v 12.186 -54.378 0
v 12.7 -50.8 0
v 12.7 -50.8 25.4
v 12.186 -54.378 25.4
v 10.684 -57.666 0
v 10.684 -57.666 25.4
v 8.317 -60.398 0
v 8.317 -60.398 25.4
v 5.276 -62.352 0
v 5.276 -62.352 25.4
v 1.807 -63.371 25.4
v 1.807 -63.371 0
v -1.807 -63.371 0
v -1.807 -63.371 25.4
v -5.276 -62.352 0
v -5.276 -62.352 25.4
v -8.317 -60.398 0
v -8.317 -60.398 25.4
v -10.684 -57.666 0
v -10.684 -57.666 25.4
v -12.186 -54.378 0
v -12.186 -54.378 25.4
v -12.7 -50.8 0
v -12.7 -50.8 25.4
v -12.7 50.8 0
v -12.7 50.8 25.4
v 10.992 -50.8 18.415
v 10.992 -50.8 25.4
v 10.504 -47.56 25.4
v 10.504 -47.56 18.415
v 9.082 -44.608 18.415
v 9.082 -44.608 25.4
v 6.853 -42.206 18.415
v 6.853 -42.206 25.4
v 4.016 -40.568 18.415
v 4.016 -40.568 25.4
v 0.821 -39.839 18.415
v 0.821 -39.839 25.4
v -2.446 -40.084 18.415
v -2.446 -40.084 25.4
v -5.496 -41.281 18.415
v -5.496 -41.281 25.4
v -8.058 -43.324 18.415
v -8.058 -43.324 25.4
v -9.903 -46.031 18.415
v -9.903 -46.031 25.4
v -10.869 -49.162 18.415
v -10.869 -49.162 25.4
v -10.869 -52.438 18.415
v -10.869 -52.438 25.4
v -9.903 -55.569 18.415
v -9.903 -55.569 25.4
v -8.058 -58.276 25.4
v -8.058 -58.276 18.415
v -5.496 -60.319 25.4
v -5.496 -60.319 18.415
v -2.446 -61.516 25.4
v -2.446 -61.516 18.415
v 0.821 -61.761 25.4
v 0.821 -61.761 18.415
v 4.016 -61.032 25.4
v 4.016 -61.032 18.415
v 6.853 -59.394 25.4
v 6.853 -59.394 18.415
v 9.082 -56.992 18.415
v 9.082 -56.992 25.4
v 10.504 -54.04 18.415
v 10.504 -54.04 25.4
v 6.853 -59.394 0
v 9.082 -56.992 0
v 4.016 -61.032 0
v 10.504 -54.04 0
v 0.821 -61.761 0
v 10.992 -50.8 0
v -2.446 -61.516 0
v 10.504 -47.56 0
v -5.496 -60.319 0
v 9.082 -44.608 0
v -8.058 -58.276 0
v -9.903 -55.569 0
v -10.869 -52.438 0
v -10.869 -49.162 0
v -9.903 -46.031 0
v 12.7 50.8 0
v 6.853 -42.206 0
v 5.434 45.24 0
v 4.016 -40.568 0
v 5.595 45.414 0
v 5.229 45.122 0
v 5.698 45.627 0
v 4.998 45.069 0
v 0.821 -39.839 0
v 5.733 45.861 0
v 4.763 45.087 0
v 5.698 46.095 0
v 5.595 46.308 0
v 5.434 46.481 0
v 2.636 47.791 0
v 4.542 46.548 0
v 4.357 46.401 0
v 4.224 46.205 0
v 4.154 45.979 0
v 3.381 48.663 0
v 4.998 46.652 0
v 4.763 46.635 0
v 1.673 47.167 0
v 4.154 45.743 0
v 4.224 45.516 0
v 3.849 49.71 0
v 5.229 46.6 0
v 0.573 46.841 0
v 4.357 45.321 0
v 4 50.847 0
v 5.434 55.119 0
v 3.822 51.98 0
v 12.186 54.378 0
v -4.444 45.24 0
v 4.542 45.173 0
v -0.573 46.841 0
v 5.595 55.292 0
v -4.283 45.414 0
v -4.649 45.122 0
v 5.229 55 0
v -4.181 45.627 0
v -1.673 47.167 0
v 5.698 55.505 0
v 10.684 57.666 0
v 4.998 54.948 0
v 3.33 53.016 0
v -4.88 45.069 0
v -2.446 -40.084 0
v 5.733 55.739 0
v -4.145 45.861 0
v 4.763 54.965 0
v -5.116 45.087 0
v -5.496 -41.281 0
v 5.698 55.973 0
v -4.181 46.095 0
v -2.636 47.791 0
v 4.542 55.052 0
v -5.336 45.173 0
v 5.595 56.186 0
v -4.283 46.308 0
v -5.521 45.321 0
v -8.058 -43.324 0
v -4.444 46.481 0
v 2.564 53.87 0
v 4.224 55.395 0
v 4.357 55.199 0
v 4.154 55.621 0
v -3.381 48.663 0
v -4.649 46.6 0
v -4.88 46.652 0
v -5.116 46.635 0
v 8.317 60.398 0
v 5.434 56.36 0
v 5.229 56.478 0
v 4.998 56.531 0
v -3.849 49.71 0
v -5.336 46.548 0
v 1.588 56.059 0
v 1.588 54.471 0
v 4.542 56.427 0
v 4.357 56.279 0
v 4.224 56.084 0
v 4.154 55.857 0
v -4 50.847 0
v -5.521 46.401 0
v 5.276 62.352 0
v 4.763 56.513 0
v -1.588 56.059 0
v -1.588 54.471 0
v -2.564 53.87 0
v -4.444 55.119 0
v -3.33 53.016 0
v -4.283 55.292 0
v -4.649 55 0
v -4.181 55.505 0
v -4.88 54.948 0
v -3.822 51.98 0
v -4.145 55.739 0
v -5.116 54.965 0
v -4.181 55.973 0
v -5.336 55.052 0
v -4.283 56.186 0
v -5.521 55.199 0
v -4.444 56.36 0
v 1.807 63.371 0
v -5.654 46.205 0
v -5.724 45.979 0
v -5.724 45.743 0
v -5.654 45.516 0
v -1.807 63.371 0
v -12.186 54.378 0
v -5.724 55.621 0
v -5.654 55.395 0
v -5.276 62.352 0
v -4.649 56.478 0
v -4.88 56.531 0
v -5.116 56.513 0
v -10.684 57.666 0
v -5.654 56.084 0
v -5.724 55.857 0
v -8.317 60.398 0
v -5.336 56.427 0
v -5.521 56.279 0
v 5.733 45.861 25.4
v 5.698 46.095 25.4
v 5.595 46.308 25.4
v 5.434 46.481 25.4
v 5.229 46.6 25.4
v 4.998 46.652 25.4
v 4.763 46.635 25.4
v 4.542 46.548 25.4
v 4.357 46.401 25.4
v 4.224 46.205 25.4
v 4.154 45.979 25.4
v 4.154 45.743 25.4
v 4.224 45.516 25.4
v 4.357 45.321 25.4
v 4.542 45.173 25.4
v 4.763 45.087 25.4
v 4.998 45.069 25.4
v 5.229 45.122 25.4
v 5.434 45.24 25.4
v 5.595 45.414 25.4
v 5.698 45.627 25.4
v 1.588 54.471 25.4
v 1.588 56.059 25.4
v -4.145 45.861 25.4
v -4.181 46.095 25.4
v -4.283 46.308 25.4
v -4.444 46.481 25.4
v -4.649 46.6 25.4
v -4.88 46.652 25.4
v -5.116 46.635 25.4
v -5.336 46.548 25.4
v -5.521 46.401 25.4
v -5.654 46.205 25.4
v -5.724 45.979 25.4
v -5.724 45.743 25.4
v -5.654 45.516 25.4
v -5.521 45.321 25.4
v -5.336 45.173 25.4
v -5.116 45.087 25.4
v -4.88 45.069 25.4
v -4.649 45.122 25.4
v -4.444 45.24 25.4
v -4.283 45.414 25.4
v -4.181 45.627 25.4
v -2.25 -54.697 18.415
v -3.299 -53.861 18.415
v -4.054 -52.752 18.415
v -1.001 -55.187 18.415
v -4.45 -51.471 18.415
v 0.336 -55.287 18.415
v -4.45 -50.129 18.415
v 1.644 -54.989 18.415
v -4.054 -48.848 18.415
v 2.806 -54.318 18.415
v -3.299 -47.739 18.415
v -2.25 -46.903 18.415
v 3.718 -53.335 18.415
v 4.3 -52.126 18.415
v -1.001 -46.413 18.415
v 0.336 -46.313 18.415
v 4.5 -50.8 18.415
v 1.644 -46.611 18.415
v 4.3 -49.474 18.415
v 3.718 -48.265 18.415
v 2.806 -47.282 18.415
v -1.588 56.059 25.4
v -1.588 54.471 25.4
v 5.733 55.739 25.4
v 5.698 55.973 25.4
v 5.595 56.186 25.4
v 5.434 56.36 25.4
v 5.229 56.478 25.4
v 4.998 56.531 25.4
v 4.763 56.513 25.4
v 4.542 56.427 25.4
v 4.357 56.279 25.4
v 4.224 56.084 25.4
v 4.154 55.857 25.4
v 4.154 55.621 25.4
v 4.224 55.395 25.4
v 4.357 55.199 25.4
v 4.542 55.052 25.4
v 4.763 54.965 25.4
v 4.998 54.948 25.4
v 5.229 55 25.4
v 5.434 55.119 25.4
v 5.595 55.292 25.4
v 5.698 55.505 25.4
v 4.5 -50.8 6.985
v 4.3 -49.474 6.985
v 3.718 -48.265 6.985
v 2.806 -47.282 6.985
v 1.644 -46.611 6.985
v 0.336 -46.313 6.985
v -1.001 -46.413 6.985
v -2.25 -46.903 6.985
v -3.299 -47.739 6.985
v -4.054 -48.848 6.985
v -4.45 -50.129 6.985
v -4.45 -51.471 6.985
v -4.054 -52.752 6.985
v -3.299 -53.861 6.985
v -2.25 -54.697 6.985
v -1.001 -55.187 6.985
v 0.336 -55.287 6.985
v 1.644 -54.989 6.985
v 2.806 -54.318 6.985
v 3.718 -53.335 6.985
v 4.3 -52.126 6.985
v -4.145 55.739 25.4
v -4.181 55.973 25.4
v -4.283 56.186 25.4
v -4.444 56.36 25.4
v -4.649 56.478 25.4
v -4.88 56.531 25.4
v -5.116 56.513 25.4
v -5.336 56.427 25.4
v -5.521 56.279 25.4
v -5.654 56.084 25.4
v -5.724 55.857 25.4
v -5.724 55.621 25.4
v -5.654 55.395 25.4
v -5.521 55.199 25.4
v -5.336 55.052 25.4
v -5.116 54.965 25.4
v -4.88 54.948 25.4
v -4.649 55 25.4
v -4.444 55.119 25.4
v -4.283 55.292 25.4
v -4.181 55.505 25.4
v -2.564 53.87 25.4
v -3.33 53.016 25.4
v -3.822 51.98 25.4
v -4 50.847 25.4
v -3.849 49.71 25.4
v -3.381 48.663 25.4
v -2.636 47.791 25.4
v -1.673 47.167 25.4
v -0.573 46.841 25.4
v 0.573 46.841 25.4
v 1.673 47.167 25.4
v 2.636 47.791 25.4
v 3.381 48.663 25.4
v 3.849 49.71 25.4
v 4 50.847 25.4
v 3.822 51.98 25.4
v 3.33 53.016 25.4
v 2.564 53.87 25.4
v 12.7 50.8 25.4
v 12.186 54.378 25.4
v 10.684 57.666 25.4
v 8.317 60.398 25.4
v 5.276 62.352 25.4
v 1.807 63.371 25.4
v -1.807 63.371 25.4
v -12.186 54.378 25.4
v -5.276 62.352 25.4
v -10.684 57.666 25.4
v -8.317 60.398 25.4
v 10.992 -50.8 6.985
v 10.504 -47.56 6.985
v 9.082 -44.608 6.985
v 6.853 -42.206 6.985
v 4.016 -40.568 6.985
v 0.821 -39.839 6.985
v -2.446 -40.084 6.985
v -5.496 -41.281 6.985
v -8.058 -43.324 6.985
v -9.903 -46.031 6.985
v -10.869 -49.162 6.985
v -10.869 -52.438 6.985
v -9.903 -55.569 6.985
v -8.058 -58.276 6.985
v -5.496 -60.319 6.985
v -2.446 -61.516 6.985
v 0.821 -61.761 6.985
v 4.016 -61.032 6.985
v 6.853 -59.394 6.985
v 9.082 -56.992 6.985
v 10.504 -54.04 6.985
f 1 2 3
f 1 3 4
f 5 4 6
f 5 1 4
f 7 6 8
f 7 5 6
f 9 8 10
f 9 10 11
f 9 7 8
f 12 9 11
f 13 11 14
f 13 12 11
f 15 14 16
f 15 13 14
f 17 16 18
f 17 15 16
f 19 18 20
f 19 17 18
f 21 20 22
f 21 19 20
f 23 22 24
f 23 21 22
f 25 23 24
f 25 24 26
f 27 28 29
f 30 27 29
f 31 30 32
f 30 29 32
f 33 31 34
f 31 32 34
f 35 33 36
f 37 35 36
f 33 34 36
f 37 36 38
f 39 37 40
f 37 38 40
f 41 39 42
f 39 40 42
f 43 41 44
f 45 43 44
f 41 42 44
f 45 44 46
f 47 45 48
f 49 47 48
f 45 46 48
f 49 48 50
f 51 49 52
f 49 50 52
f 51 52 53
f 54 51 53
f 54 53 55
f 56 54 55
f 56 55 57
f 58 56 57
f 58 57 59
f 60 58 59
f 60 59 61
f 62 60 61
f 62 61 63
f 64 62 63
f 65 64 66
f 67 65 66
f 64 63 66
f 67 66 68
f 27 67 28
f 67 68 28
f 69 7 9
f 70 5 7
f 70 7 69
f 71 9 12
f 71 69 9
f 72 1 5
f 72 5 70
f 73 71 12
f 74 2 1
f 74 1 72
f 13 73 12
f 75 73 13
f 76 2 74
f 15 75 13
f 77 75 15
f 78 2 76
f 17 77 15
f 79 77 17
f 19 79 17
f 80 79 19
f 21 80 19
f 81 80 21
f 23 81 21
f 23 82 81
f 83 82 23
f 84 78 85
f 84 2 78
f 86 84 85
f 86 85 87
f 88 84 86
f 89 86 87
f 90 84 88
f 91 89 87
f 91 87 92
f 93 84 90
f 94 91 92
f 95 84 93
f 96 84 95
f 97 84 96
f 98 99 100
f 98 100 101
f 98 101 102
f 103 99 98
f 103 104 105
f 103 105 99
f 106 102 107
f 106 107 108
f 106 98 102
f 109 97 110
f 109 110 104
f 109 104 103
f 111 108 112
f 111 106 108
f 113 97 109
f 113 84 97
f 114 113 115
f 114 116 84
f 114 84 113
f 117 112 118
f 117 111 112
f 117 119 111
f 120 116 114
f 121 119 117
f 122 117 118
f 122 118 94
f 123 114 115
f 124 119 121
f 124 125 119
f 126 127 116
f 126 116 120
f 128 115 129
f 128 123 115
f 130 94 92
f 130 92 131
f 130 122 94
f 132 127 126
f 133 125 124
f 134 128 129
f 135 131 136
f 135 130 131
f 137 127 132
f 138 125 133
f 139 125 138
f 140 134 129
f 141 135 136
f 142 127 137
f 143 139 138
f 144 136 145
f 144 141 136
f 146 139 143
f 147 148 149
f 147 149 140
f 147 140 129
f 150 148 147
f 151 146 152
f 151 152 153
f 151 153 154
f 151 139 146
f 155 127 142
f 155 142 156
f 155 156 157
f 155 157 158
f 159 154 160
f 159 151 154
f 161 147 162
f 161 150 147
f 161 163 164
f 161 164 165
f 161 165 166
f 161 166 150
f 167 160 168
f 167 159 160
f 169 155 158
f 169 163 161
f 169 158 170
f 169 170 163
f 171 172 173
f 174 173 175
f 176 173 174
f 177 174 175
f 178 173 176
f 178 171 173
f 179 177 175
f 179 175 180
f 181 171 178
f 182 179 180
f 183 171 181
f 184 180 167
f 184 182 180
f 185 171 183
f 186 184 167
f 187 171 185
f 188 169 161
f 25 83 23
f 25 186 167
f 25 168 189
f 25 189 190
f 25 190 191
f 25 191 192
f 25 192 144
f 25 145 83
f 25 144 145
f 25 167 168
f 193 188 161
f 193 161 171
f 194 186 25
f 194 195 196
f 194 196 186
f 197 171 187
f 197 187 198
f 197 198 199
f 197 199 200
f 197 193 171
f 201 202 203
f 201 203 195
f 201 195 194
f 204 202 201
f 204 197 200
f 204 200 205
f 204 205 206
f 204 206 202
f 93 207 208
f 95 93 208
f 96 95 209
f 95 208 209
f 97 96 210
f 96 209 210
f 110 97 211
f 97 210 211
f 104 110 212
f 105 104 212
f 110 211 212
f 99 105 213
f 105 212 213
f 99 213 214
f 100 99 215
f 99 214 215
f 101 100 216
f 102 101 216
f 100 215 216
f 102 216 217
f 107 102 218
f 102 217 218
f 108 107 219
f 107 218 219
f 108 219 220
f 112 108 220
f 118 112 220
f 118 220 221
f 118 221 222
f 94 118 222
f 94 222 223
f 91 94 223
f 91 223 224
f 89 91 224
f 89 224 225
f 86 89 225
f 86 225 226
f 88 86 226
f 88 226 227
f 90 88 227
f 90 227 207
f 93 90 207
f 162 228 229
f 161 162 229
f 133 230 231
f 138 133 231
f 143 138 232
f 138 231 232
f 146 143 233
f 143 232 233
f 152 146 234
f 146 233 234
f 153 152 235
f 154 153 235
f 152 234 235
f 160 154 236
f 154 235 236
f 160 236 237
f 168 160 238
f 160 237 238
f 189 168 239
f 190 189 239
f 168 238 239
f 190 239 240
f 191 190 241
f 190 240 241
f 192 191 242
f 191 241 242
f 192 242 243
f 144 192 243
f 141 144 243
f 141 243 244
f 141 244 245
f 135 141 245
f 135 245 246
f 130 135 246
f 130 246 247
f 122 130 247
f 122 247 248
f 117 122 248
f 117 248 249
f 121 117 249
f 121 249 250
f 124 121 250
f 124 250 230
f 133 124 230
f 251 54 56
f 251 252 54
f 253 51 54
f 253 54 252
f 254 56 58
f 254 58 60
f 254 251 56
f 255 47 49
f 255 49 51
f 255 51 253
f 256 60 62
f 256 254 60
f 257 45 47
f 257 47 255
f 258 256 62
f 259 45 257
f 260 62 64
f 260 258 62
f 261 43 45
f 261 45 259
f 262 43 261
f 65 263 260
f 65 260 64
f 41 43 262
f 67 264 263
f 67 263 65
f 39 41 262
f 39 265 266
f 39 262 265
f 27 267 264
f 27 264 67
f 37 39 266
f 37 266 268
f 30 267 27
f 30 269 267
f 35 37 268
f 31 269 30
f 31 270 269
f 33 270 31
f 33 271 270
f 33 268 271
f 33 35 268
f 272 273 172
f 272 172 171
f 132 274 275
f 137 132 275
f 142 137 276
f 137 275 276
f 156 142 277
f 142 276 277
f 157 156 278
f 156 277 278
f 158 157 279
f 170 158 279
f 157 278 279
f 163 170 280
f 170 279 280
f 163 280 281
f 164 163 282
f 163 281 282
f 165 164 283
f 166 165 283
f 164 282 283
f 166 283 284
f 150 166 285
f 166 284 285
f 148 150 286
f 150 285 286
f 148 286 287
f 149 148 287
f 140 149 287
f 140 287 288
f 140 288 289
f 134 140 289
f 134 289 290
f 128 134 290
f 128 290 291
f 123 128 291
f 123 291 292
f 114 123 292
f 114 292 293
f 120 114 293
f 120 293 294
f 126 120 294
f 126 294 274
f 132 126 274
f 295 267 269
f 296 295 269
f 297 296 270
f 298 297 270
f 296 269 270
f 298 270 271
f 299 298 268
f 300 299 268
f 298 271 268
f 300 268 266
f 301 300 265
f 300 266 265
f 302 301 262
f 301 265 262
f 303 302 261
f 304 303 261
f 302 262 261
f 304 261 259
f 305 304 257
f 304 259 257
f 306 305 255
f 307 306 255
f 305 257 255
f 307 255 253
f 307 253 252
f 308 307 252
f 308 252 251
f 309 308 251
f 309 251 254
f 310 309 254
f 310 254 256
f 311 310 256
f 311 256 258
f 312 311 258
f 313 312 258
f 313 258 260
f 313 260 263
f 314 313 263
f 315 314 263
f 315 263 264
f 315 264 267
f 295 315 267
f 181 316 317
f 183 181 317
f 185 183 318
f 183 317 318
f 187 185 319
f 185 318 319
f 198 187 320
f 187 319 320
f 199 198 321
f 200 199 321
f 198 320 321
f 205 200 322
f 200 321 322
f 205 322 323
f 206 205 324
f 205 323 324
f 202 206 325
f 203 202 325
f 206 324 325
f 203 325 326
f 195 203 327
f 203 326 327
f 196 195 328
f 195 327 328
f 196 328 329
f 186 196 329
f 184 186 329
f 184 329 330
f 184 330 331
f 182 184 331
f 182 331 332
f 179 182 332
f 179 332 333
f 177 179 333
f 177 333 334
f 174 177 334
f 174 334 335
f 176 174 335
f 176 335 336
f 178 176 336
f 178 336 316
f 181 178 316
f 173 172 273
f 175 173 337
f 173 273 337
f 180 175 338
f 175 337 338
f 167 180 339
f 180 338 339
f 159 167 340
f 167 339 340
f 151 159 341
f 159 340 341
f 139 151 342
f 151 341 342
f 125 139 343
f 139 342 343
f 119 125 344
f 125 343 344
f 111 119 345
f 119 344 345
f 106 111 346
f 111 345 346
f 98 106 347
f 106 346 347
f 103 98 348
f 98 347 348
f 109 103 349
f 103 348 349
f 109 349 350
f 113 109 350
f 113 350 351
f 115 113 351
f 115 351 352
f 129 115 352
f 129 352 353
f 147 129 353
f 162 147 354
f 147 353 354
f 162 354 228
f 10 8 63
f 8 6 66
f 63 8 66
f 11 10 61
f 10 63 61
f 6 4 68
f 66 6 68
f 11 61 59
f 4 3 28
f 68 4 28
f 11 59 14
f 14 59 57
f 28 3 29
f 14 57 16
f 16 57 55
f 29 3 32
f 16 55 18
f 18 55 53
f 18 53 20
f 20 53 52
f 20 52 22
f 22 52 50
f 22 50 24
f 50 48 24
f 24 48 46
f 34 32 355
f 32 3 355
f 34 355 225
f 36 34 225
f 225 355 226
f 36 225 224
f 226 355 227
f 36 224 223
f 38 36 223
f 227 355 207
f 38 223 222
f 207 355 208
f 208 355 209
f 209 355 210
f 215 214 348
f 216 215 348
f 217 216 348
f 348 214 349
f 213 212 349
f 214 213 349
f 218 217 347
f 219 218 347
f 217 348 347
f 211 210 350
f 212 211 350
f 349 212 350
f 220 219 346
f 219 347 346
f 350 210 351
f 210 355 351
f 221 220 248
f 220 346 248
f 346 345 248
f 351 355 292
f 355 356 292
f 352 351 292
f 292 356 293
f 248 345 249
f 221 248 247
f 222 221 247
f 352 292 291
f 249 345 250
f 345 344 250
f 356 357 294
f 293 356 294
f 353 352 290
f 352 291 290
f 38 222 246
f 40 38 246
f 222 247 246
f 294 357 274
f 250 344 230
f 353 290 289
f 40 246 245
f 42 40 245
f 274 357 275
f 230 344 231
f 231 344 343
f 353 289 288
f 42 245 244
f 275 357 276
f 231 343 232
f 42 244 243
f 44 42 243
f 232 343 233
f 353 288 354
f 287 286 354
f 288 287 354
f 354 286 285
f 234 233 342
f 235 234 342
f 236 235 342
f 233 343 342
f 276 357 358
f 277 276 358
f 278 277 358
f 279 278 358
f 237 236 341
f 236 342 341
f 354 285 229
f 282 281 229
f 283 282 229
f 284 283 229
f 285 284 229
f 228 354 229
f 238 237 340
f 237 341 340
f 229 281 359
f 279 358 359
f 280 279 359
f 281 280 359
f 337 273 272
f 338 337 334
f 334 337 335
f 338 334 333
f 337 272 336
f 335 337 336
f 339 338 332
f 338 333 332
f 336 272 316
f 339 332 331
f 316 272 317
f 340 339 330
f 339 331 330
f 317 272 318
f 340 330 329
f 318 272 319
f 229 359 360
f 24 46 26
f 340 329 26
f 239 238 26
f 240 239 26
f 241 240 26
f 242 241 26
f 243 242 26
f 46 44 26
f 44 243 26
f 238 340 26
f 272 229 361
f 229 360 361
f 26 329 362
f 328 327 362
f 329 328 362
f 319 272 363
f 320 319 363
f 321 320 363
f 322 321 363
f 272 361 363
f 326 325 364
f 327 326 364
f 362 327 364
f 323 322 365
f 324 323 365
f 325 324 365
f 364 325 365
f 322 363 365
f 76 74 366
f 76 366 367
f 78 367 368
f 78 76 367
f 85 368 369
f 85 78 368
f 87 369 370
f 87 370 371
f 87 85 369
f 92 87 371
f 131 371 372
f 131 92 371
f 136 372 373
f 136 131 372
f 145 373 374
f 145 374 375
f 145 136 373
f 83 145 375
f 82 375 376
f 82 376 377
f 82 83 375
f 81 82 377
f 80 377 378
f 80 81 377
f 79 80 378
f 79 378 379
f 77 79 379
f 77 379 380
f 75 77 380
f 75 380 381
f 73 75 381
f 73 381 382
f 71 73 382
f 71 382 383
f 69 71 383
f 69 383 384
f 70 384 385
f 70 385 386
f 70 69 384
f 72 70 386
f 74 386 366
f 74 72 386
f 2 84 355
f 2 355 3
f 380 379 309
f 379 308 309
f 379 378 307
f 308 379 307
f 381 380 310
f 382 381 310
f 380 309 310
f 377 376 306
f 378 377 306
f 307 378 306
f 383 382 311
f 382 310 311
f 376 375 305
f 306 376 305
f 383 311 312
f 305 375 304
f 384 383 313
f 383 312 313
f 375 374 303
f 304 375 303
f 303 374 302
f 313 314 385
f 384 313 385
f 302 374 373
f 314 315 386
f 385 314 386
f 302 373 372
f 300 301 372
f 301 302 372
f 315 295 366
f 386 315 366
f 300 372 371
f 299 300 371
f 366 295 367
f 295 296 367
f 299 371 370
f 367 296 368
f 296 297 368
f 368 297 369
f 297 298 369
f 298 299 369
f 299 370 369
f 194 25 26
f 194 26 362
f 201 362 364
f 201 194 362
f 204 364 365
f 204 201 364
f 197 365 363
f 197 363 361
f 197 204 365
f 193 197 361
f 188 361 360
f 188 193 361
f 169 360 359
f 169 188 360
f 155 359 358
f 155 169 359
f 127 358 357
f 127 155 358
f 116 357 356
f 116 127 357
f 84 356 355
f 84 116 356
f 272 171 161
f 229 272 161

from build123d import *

# Parameters (mm, degrees)
BOSS_EXTRUDE1_DEPTH = 25.4
CUT_EXTRUDE1_REACH  = 27.4
SKETCH2_R           = 4
SKETCH2_R_2         = 0.79375
SKETCH3_W           = 3.175
SKETCH3_H           = 1.5875
CUT_EXTRUDE2_DEPTH  = 26.4
SKETCH4_R           = 10.99185
CUT_EXTRUDE3_DEPTH  = 6.985
SKETCH5_R           = 4.5
CUT_EXTRUDE4_DEPTH  = 19.415


with BuildPart() as part:
    # Sketch1 → Boss-Extrude1 (new body)
    with BuildSketch(Plane.XY):
        with BuildLine():
            Line((12.7, 50.8), (12.7, -50.8))
            ThreePointArc((12.7, -50.8), (0, -63.5), (-12.7, -50.8))
            Line((-12.7, -50.8), (-12.7, 50.8))
            ThreePointArc((-12.7, 50.8), (0, 63.5), (12.7, 50.8))
        make_face()
    extrude(amount=BOSS_EXTRUDE1_DEPTH)

    # Sketch2 → Cut-Extrude1 (cut, up to next)
    with BuildSketch(Plane.XY.offset(25.4), mode=Mode.PRIVATE) as cut_extrude1_sk1:
        with Locations((0, 50.8)):
            Circle(SKETCH2_R)
    cut_extrude1_tool1 = extrude(cut_extrude1_sk1.sketch, amount=-CUT_EXTRUDE1_REACH, mode=Mode.PRIVATE) & part.part
    add(cut_extrude1_tool1.solids().sort_by_distance((0, 50.8, 25.4))[0], mode=Mode.SUBTRACT)
    # Sketch2 → Cut-Extrude1 (cut, up to next)
    with BuildSketch(Plane.XY.offset(25.4), mode=Mode.PRIVATE) as cut_extrude1_sk2:
        with Locations((-4.939140867, 55.739140867)):
            Circle(SKETCH2_R_2)
    cut_extrude1_tool2 = extrude(cut_extrude1_sk2.sketch, amount=-CUT_EXTRUDE1_REACH, mode=Mode.PRIVATE) & part.part
    add(cut_extrude1_tool2.solids().sort_by_distance((-4.939141, 55.739141, 25.4))[0], mode=Mode.SUBTRACT)
    # Sketch2 → Cut-Extrude1 (cut, up to next)
    with BuildSketch(Plane.XY.offset(25.4), mode=Mode.PRIVATE) as cut_extrude1_sk3:
        with Locations((-4.939140867, 45.860859133)):
            Circle(SKETCH2_R_2)
    cut_extrude1_tool3 = extrude(cut_extrude1_sk3.sketch, amount=-CUT_EXTRUDE1_REACH, mode=Mode.PRIVATE) & part.part
    add(cut_extrude1_tool3.solids().sort_by_distance((-4.939141, 45.860859, 25.4))[0], mode=Mode.SUBTRACT)
    # Sketch2 → Cut-Extrude1 (cut, up to next)
    with BuildSketch(Plane.XY.offset(25.4), mode=Mode.PRIVATE) as cut_extrude1_sk4:
        with Locations((4.939140867, 55.739140867)):
            Circle(SKETCH2_R_2)
    cut_extrude1_tool4 = extrude(cut_extrude1_sk4.sketch, amount=-CUT_EXTRUDE1_REACH, mode=Mode.PRIVATE) & part.part
    add(cut_extrude1_tool4.solids().sort_by_distance((4.939141, 55.739141, 25.4))[0], mode=Mode.SUBTRACT)
    # Sketch2 → Cut-Extrude1 (cut, up to next)
    with BuildSketch(Plane.XY.offset(25.4), mode=Mode.PRIVATE) as cut_extrude1_sk5:
        with Locations((4.939140867, 45.860859133)):
            Circle(SKETCH2_R_2)
    cut_extrude1_tool5 = extrude(cut_extrude1_sk5.sketch, amount=-CUT_EXTRUDE1_REACH, mode=Mode.PRIVATE) & part.part
    add(cut_extrude1_tool5.solids().sort_by_distance((4.939141, 45.860859, 25.4))[0], mode=Mode.SUBTRACT)

    # Sketch3 → Cut-Extrude2 (cut, through all)
    with BuildSketch(Plane.XY.offset(25.4)):
        with Locations((0, 55.265240671)):
            Rectangle(SKETCH3_W, SKETCH3_H)
    extrude(amount=-CUT_EXTRUDE2_DEPTH, mode=Mode.SUBTRACT)

    # Sketch4 → Cut-Extrude3 (cut)
    with BuildSketch(Plane.XY.offset(25.4)):
        with Locations((0, -50.8)):
            Circle(SKETCH4_R)
    cut_extrude3 = extrude(amount=-CUT_EXTRUDE3_DEPTH, mode=Mode.SUBTRACT)

    # Mirror1: Cut-Extrude3 across plane
    add(cut_extrude3.mirror(Plane.XY.offset(12.7)), mode=Mode.SUBTRACT)

    # Sketch5 → Cut-Extrude4 (cut, through all)
    with BuildSketch(Plane.XY.offset(18.415)):
        with Locations((0, -50.8)):
            Circle(SKETCH5_R)
    extrude(amount=-CUT_EXTRUDE4_DEPTH, mode=Mode.SUBTRACT)


solid = part.part
